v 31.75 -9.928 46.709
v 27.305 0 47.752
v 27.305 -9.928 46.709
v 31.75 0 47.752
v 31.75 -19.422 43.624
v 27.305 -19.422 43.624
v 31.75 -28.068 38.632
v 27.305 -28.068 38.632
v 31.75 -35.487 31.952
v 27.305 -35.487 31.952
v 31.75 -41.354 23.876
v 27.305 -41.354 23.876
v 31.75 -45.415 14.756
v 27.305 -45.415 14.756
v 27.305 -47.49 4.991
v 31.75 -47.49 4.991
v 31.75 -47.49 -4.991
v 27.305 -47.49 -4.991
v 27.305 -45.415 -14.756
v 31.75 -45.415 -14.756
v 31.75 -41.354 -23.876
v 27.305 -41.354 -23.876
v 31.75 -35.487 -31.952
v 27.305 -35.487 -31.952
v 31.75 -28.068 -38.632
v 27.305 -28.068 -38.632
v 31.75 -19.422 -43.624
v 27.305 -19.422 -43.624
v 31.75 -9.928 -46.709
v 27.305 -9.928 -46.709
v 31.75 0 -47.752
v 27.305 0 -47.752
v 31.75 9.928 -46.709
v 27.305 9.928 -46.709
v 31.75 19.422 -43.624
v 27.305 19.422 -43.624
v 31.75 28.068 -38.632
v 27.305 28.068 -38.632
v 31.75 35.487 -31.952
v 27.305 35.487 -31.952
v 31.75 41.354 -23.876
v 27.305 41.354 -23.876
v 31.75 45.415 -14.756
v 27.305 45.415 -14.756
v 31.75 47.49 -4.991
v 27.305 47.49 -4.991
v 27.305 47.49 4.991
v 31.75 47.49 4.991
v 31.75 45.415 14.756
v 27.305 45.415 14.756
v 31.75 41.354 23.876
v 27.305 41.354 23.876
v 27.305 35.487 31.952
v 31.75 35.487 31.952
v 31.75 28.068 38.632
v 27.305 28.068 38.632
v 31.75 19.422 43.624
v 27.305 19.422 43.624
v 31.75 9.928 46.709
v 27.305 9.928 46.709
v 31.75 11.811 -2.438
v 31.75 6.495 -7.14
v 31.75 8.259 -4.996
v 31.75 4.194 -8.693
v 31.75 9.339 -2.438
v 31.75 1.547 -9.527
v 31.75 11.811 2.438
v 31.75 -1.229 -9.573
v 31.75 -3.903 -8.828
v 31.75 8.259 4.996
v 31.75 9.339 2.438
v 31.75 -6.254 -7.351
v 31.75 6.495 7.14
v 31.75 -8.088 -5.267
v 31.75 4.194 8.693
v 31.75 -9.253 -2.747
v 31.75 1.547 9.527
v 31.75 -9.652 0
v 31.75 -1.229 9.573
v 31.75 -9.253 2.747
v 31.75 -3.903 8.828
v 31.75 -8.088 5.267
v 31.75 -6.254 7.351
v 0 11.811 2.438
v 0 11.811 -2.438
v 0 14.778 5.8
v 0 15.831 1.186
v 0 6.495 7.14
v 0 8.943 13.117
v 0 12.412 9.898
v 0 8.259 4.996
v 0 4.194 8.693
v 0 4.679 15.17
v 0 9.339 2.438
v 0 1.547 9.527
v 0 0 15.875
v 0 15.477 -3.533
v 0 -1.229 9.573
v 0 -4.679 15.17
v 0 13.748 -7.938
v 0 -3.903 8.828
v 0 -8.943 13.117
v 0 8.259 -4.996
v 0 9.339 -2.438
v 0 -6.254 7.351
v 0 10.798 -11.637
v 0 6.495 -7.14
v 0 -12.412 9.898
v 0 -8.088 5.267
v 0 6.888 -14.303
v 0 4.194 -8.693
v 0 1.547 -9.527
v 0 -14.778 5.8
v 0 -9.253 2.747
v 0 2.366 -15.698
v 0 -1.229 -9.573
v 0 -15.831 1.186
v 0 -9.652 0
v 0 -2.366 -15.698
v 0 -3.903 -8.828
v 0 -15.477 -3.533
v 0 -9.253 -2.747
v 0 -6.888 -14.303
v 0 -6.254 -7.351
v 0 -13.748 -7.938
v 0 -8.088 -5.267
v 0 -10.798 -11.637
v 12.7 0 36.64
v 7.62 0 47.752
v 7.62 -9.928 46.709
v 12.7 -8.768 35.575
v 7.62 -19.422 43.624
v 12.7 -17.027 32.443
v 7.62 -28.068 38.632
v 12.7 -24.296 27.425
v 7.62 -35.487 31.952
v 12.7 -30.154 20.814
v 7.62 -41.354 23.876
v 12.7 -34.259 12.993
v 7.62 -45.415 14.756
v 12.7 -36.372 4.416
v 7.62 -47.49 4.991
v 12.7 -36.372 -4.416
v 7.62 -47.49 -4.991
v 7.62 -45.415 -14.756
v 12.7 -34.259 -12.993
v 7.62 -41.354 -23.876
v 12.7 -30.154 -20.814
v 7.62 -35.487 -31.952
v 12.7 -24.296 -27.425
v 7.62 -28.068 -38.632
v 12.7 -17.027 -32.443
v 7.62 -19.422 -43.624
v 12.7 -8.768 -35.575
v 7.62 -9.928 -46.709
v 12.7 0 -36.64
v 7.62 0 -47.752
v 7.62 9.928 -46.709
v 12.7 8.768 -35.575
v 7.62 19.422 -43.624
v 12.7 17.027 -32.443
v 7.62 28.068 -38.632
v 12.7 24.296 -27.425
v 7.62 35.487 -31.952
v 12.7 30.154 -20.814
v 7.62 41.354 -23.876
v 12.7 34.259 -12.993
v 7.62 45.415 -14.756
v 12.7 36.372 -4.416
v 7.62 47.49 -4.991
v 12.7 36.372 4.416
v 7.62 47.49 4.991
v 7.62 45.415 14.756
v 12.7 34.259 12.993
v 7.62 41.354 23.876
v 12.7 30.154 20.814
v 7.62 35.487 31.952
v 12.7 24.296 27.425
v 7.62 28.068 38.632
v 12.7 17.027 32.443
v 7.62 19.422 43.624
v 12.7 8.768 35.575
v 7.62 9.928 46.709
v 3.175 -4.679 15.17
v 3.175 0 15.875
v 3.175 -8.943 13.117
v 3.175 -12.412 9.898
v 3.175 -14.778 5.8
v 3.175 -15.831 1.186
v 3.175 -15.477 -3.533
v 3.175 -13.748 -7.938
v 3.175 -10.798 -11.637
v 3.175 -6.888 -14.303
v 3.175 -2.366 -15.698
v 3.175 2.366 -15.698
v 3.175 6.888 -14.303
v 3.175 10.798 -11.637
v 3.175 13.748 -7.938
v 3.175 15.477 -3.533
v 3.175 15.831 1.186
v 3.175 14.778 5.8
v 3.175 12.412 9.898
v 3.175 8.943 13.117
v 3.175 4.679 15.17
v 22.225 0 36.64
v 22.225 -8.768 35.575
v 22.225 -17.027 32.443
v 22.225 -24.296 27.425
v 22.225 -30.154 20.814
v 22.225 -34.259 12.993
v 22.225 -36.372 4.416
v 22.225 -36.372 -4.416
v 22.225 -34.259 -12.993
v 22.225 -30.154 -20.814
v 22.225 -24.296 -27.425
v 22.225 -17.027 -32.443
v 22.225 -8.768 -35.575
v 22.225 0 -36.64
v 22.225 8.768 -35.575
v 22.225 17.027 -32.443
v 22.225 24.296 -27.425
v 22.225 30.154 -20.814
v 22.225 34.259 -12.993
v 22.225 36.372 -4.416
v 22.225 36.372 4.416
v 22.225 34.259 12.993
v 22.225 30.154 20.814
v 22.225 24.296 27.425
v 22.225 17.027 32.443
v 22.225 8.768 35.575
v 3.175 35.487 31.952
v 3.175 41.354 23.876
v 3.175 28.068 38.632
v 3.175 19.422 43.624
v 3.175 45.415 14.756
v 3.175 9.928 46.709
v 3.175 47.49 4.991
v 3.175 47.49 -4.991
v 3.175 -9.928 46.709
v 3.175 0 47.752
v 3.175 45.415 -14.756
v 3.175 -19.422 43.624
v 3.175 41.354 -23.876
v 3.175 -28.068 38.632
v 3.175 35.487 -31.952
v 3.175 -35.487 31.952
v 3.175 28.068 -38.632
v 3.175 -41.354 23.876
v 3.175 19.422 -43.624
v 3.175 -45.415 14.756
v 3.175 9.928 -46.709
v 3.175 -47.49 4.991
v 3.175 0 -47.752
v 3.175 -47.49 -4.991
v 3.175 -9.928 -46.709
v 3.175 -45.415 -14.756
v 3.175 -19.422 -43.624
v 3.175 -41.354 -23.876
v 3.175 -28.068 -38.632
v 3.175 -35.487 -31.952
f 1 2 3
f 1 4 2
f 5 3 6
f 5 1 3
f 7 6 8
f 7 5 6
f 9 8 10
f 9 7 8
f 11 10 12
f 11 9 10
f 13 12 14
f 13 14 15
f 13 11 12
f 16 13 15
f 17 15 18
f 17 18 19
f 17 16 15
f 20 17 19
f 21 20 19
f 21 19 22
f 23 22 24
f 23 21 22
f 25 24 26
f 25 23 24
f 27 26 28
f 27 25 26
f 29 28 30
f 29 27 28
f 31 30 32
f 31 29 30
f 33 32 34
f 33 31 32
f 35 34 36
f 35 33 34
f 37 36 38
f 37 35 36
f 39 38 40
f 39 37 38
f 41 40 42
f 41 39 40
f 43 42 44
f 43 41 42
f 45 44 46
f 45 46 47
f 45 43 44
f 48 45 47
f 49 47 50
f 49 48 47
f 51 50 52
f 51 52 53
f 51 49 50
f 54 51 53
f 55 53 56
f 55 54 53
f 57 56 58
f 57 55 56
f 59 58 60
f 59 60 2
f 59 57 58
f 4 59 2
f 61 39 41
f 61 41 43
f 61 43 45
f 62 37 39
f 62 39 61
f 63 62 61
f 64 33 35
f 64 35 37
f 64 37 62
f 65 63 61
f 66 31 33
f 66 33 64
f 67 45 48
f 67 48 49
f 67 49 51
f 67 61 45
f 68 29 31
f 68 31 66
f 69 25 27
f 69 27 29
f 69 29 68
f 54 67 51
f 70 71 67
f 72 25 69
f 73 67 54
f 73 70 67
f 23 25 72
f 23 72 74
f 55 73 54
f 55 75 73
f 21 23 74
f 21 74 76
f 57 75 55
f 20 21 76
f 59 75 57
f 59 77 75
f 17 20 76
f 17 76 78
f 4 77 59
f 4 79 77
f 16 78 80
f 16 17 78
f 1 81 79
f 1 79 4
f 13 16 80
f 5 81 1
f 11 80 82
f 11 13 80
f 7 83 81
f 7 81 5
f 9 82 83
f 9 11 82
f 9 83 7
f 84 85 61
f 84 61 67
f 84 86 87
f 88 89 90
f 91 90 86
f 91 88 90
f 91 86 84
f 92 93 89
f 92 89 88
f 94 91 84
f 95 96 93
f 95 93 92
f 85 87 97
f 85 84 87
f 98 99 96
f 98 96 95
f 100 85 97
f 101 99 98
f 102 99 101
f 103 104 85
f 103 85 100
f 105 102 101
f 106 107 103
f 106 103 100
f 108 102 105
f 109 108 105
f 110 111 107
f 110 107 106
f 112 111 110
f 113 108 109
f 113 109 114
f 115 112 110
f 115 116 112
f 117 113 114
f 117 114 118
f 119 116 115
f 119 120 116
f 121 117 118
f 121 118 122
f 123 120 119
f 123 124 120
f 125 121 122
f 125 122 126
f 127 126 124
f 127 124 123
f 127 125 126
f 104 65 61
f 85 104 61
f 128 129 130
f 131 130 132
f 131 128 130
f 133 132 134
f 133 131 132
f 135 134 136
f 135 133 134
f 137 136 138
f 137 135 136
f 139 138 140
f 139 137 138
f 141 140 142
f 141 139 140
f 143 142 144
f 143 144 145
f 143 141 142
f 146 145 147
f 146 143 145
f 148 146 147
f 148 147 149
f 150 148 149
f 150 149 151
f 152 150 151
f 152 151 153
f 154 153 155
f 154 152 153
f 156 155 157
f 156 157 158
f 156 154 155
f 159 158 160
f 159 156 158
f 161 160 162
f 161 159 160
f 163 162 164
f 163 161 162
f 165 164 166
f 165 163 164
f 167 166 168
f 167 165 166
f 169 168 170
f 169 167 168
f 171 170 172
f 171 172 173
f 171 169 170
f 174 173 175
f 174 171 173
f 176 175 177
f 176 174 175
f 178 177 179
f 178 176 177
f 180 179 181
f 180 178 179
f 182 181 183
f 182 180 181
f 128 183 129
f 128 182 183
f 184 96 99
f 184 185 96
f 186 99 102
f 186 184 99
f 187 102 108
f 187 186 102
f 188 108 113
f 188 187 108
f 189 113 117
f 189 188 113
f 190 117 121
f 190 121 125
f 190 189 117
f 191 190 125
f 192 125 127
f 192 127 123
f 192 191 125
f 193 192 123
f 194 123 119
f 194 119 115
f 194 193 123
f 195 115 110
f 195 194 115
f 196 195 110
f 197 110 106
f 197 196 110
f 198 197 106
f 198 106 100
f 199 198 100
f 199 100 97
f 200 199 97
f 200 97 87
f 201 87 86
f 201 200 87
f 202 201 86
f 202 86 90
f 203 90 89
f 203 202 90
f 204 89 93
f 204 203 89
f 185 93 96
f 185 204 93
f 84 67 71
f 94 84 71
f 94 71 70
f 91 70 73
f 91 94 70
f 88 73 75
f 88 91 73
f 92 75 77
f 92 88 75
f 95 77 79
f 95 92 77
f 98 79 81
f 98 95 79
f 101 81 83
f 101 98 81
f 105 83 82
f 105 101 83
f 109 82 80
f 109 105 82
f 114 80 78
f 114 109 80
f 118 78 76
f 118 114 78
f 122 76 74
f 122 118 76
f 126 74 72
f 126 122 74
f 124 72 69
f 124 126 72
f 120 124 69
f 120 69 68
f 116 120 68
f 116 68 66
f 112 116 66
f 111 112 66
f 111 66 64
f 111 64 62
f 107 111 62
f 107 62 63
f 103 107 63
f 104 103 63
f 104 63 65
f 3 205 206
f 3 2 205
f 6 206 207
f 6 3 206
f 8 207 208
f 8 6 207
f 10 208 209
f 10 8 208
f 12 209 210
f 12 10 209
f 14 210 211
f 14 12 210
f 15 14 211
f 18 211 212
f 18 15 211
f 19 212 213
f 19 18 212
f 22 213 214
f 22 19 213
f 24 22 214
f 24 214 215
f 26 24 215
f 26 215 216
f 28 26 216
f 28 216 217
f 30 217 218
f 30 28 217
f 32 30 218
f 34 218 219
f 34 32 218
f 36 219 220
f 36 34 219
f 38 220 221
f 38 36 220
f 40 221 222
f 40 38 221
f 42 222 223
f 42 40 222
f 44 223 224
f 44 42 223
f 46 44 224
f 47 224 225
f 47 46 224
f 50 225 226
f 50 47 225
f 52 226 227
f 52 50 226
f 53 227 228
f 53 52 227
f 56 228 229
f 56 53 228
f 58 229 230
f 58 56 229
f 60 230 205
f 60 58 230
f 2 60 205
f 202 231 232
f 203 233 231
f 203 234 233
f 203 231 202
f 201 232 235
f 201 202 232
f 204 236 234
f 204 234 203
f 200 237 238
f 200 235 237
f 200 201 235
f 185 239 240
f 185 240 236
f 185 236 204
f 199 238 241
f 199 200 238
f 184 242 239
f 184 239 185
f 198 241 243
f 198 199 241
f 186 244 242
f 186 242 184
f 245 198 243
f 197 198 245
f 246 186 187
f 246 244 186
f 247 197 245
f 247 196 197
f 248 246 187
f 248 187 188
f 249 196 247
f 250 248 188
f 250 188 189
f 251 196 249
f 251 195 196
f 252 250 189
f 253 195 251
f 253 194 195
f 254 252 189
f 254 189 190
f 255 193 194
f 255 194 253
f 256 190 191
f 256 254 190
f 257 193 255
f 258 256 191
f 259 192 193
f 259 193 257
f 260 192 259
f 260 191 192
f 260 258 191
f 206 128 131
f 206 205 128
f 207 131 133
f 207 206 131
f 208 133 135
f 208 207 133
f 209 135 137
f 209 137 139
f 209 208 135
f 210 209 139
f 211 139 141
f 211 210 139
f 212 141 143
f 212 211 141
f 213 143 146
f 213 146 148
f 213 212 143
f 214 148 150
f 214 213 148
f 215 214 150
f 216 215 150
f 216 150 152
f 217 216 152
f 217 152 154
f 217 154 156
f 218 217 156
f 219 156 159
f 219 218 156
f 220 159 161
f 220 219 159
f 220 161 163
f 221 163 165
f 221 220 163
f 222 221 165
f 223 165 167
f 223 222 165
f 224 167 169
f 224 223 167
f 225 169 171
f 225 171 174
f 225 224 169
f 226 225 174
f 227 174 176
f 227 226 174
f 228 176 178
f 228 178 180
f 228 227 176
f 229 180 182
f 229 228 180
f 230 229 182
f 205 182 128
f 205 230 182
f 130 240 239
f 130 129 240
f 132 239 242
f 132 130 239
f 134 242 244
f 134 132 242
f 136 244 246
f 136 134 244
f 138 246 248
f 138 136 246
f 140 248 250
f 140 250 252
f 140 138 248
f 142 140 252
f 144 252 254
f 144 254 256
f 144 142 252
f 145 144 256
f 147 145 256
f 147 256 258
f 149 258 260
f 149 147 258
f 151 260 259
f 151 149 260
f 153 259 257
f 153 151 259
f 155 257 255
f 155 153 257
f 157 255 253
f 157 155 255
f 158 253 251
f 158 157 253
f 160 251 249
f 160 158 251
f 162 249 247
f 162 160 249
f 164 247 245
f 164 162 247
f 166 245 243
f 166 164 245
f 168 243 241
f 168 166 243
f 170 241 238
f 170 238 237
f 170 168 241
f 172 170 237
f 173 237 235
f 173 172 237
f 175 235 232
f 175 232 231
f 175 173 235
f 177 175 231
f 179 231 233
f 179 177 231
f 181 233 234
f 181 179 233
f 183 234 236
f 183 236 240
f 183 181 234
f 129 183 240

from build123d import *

# Parameters (mm, degrees)
CUT_EXTRUDE1_REACH = 76.623


with BuildPart() as part:
    # Sketch1 → Revolve1 (revolve)
    with BuildSketch(Plane.XY, mode=Mode.PRIVATE) as revolve1_sk:
        Polygon((31.75, 9.652), (0, 9.652), (0, 15.875), (3.175, 15.875), (3.175, 47.752), (7.62, 47.752), (12.7, 36.6395), (22.225, 36.6395), (27.305, 47.752), (31.75, 47.752), align=None)
    revolve(revolve1_sk.sketch.rotate(Axis((0, 0, 0), (1, 0, 0)), 90), axis=Axis((0, 0, 0), (1, 0, 0)))

    # Sketch2 → Cut-Extrude1 (cut, up to next)
    with BuildSketch(Plane.ZY, mode=Mode.PRIVATE) as cut_extrude1_sk1:
        with BuildLine():
            Line((-2.4384, 9.338913718), (-2.4384, 11.811))
            Line((-2.4384, 11.811), (2.4384, 11.811))
            Line((2.4384, 11.811), (2.4384, 9.338913718))
            ThreePointArc((2.4384, 9.338913718), (0, 9.652), (-2.4384, 9.338913718))
        make_face()
    cut_extrude1_tool1 = extrude(cut_extrude1_sk1.sketch, amount=-CUT_EXTRUDE1_REACH, mode=Mode.PRIVATE) & part.part
    add(cut_extrude1_tool1.solids().sort_by_distance((0, 10.677746, 0))[0], mode=Mode.SUBTRACT)


solid = part.part
